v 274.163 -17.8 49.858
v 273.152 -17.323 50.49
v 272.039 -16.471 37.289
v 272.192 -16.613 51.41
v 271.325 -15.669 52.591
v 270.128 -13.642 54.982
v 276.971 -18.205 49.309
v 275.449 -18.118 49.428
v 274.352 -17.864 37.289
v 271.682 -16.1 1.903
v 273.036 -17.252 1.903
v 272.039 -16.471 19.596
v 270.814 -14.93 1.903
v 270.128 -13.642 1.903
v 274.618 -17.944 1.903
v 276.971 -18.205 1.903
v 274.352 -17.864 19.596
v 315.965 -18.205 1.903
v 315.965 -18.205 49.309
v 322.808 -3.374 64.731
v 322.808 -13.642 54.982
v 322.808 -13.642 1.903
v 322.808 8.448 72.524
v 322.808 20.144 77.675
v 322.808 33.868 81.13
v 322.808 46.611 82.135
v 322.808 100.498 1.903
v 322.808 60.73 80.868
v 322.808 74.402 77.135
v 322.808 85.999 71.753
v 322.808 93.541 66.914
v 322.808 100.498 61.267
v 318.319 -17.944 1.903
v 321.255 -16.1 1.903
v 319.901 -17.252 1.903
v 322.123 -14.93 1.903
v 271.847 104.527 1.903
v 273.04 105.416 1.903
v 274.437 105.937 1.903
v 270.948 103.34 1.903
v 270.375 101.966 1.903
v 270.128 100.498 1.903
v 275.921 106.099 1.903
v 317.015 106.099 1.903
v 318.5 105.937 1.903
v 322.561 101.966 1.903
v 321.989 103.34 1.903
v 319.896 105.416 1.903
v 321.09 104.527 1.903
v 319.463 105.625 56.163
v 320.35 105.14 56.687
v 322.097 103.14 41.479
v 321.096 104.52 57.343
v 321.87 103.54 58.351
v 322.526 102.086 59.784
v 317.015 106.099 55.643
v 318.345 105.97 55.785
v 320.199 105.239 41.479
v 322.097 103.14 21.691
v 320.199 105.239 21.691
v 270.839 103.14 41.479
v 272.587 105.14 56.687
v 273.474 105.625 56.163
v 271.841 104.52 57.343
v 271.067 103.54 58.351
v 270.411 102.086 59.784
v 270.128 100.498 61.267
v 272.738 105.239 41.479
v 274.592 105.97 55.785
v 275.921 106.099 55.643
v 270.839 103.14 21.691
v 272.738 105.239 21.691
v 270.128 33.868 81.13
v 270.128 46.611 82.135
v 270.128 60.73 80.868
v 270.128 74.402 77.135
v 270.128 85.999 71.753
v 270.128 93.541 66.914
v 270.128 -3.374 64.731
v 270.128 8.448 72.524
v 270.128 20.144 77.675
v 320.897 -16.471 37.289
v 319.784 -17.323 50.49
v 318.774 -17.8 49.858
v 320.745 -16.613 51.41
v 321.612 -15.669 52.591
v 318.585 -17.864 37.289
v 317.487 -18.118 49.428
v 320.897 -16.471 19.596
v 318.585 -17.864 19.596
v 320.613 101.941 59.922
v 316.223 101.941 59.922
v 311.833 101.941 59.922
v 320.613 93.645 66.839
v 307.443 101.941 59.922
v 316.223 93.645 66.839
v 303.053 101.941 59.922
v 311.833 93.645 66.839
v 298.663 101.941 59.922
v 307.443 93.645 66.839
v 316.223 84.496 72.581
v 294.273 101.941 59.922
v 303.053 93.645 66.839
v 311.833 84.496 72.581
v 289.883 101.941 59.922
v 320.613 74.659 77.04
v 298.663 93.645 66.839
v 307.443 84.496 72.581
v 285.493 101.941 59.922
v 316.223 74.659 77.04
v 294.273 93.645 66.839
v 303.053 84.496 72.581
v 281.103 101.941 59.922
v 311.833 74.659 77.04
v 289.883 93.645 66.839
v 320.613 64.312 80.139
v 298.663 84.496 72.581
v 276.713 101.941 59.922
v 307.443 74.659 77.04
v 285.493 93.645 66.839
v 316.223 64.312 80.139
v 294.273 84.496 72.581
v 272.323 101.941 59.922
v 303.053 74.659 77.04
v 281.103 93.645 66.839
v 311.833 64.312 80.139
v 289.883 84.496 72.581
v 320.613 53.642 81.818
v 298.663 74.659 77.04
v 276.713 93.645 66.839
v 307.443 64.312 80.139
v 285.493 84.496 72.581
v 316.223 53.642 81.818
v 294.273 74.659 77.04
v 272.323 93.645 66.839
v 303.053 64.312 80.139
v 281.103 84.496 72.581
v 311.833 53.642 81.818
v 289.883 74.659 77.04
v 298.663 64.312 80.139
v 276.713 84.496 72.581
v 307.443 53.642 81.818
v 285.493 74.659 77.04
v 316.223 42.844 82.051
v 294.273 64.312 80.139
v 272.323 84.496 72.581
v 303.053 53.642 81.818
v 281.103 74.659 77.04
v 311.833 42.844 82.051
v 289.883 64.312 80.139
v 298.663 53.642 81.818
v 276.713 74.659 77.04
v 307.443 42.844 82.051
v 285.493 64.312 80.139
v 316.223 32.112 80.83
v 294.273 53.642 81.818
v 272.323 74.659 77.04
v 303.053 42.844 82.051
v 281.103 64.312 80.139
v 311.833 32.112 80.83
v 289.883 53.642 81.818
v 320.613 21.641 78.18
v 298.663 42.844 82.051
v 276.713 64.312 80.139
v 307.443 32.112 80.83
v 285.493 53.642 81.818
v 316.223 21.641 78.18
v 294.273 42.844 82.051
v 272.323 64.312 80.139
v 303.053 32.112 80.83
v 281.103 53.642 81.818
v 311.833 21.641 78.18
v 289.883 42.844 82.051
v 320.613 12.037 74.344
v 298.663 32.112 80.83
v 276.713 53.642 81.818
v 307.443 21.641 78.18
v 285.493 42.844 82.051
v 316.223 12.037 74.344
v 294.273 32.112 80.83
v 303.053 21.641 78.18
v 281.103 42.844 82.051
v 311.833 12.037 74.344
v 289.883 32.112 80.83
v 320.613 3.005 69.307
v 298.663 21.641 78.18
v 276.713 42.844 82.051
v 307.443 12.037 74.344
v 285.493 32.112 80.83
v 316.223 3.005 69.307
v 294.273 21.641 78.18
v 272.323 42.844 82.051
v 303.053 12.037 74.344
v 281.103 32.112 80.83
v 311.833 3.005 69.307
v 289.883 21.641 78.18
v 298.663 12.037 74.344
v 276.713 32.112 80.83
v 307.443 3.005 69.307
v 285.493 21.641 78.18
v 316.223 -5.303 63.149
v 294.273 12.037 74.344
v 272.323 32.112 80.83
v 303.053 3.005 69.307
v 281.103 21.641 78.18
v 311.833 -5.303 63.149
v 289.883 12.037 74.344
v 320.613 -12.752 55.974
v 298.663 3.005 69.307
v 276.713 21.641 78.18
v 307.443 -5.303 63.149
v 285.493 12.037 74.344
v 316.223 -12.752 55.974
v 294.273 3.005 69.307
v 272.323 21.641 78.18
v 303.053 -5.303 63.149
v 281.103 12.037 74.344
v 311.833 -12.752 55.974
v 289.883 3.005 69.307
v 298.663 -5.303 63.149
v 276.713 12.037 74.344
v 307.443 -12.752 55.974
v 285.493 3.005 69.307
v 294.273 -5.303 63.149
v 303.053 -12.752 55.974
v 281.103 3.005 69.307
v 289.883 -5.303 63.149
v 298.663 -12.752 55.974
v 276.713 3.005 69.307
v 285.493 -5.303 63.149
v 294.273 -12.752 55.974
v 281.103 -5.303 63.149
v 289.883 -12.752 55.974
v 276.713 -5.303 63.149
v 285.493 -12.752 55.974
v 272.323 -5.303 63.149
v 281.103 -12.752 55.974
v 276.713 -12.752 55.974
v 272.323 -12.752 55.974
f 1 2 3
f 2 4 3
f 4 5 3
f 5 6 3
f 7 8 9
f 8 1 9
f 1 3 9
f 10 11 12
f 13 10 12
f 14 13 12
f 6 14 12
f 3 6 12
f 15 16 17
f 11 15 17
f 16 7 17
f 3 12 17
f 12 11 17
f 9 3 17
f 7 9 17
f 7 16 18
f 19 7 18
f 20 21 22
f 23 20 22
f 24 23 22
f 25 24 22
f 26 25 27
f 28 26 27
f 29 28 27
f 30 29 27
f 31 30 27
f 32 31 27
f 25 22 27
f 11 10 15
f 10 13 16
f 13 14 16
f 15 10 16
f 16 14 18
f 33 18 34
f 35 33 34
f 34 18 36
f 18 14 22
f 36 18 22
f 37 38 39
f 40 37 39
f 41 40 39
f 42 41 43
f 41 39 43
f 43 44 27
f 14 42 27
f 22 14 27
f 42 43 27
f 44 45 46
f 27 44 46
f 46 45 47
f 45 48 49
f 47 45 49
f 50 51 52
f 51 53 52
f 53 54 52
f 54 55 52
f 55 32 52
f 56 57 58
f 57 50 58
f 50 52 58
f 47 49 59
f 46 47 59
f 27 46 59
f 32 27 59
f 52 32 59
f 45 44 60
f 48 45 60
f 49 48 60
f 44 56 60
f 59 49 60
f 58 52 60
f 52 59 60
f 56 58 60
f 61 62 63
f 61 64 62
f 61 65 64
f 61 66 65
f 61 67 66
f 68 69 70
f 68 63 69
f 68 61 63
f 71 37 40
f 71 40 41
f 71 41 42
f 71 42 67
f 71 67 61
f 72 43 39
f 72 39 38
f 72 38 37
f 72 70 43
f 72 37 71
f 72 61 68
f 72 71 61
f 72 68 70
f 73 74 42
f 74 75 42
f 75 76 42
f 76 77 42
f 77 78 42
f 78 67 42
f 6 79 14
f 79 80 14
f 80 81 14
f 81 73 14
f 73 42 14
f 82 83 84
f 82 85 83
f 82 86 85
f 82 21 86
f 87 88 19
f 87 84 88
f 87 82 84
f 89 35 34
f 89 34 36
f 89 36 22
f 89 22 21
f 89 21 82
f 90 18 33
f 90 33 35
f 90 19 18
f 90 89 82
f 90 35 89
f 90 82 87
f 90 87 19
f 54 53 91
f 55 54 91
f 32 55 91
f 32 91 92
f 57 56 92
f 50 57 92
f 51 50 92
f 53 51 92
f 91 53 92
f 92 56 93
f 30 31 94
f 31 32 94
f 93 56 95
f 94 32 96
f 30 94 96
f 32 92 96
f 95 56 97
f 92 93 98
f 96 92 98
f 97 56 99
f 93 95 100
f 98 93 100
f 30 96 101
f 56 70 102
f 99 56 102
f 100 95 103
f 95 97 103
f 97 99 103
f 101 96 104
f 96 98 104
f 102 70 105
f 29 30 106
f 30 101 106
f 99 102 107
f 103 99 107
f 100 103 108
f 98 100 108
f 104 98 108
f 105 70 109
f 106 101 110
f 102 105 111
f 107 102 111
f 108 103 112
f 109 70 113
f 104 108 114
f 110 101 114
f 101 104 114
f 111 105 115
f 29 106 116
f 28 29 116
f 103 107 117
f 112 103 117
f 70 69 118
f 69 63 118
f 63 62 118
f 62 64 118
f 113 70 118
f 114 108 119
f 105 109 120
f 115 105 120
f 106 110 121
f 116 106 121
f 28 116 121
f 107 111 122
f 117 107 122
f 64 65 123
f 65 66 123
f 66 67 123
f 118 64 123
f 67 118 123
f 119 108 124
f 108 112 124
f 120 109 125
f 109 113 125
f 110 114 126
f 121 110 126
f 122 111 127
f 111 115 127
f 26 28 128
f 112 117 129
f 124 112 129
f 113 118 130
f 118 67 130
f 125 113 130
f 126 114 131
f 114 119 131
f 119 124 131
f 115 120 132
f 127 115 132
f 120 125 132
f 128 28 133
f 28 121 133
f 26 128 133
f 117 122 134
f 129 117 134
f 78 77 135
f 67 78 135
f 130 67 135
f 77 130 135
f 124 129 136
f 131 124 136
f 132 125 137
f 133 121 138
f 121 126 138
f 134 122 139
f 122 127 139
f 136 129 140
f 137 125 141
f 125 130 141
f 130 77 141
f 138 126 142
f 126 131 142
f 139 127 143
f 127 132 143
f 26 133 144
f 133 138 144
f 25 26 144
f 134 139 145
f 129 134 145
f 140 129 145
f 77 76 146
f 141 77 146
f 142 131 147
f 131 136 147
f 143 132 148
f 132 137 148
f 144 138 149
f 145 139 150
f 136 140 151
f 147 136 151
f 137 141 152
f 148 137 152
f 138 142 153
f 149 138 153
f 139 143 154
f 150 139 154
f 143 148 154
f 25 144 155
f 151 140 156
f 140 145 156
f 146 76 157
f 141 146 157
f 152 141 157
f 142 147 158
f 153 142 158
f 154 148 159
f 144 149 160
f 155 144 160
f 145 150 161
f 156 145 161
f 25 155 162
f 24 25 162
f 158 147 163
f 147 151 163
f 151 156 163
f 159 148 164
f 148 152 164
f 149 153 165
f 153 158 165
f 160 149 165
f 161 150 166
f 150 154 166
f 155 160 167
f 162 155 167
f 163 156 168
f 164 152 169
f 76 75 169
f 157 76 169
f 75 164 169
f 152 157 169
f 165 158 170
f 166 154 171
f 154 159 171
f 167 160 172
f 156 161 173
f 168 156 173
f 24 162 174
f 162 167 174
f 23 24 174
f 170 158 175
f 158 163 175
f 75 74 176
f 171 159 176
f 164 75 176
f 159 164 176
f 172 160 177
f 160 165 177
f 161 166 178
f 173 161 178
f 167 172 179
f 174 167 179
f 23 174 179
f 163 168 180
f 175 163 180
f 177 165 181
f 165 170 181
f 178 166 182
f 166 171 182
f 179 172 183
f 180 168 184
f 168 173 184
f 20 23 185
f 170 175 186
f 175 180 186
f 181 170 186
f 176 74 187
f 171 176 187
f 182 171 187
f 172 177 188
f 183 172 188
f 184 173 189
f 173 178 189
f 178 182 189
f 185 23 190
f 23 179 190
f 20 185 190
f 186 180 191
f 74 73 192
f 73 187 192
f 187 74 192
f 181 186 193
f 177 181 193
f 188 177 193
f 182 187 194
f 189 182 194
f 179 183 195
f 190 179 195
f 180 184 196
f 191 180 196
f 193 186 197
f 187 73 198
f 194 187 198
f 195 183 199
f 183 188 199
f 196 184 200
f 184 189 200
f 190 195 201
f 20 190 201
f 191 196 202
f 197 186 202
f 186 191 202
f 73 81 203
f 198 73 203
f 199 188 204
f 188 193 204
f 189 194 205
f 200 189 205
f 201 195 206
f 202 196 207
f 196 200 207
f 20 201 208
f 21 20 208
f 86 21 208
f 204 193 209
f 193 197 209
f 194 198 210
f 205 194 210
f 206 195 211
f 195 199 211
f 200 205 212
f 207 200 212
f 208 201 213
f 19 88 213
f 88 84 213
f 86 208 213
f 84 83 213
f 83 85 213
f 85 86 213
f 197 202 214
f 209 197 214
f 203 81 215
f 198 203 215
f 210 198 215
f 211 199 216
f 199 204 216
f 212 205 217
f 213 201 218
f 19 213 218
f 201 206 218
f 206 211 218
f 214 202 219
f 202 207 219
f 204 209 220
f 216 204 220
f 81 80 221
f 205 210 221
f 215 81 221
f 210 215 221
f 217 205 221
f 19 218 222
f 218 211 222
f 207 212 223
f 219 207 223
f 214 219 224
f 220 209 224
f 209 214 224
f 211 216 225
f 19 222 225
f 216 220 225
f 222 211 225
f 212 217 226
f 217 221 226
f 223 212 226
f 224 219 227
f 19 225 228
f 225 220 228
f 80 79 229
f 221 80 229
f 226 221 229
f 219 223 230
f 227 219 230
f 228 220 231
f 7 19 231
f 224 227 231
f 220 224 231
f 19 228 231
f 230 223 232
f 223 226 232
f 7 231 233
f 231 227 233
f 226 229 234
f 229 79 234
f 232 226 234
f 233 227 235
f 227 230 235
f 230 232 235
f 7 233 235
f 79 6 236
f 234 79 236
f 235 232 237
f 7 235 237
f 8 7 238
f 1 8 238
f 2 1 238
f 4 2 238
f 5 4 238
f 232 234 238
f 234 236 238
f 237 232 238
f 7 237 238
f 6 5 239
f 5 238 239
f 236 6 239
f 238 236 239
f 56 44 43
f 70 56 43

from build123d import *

# Parameters (mm, degrees)
LOFT1_START             = 259.08
LOFT1_DEPTH             = 1021.08
CUT_EXTRUDE1_DEPTH      = 1290.62122974
LPATTERN1_COUNT         = 15
LPATTERN1_PITCH         = 53.34
CUT_EXTRUDE4_DEPTH      = 1290.62122974
CUT_EXTRUDE4_DEPTH_BACK = 1290.62122974
SKETCH12_OUTSIDE_W      = 1232.81
SKETCH12_OUTSIDE_H      = 380.64
SKETCH13_W              = 691.165372795
SKETCH13_H              = 233.895042588
CUT_EXTRUDE5_DEPTH      = 360.661187802
SCALE1_SCALE            = 0.95


# Read off the part's stored shape, not the designer's step: Loft1
with BuildPart() as part:
    # Loft1 outline → Loft1 (new body)
    with BuildSketch(Plane.YZ.offset(LOFT1_START)):
        with BuildLine():
            add(Edge.make_bspline(
                [(131.074840176, 0), (131.074840176, 7.585349878), (129.019719734, 22.755453715), (119.988374686, 43.869012627), (105.663719284, 61.816756347), (87.077737999, 75.303505752), (65.572351994, 83.356423395), (42.699502143, 85.39357748), (20.108822767, 81.269408641), (6.324958878, 74.609028267), (-5.786480365, 66.591156976), (-16.410547257, 57.496977056), (-28.534928085, 40.377986455), (-36.116650435, 20.818386871), (-37.835159824, 6.939567352), (-37.835159824, -6.939567352), (-36.116650435, -20.818386871), (-28.534928085, -40.377986455), (-16.410547257, -57.496977056), (-5.786480365, -66.591156976), (6.324958878, -74.609028267), (20.108822767, -81.269408641), (42.699502143, -85.39357748), (65.572351994, -83.356423395), (87.077737999, -75.303505752), (105.663719284, -61.816756347), (119.988374686, -43.869012627), (129.019719734, -22.755453715), (131.074840176, -7.585349878), (131.074840176, 0)],
                knots=[0, 0, 0, 0, 0.04288364, 0.08576728, 0.12865092, 0.17153456, 0.2144182, 0.25730184, 0.30018548, 0.34306912, 0.34306912, 0.38230184, 0.42153456, 0.46076728, 0.5, 0.5, 0.53923272, 0.57846544, 0.61769816, 0.65693088, 0.65693088, 0.69981452, 0.74269816, 0.7855818, 0.82846544, 0.87134908, 0.91423272, 0.95711636, 1, 1, 1, 1], degree=3))
        make_face()
    extrude(amount=LOFT1_DEPTH)

    # Sketch10 (on Front Plane) → Cut-Extrude1 (cut, symmetric)
    with BuildSketch(Plane.XY):
        with BuildLine():
            Line((370.088452905, 78.026436792), (370.088452905, 52.620114122))
            add(Edge.make_bspline(
                [(370.088452905, 52.620114122), (370.995867627, 49.272576747), (375.115065094, 47.839862903)],
                knots=[0, 0, 0, 1, 1, 1], degree=2))
            Line((375.115065094, 47.839862903), (390.064888423, 47.839862903))
            add(Edge.make_bspline(
                [(395.091500612, 52.620114122), (394.184085889, 49.272576747), (390.064888423, 47.839862903)],
                knots=[0, 0, 0, 1, 1, 1], degree=2))
            Line((395.091500612, 52.620114122), (395.091500612, 78.026436792))
            add(Edge.make_bspline(
                [(390.064888423, 82.082511515), (392.217535458, 82.043682887), (394.561076709, 80.900159735), (395.091500612, 78.026436792)],
                knots=[0, 0, 0, 0, 1, 1, 1, 1], degree=3))
            Line((390.064888423, 82.082511515), (375.115065094, 82.082511515))
            add(Edge.make_bspline(
                [(375.115065094, 82.082511515), (372.962418059, 82.043682887), (370.618876808, 80.900159735), (370.088452905, 78.026436792)],
                knots=[0, 0, 0, 0, 1, 1, 1, 1], degree=3))
        make_face()
    cut_extrude1 = extrude(amount=CUT_EXTRUDE1_DEPTH, both=True, mode=Mode.SUBTRACT)

    # LPattern1: Cut-Extrude1 ×15
    with Locations(*[(i * LPATTERN1_PITCH, 0, 0) for i in range(1, LPATTERN1_COUNT)]):
        add(cut_extrude1, mode=Mode.SUBTRACT)

    # Sketch12 outside (on Front Plane) → Cut-Extrude4 (cut, two sides: drawn at the far end of the back side and taken through both)
    with BuildSketch(Plane.XY.offset(-CUT_EXTRUDE4_DEPTH_BACK)):
        with Locations((769.62, 46.62)):
            Rectangle(SKETCH12_OUTSIDE_W, SKETCH12_OUTSIDE_H)
        with BuildLine():
            Line((268.742092957, 103.434867576), (268.742092957, -16.712334523))
            add(Edge.make_bspline(
                [(268.742092957, -16.712334523), (270.508991838, -20.579782205), (273.059867475, -21.576401142), (275.945080305, -21.515503071)],
                knots=[0, 0, 0, 0, 1, 1, 1, 1], degree=3))
            Line((275.945080305, -21.515503071), (316.991660423, -21.515503071))
            add(Edge.make_bspline(
                [(324.194647772, -16.712334523), (322.42774889, -20.579782205), (319.876873253, -21.576401142), (316.991660423, -21.515503071)],
                knots=[0, 0, 0, 0, 1, 1, 1, 1], degree=3))
            Line((324.194647772, -16.712334523), (324.194647772, 103.434867576))
            add(Edge.make_bspline(
                [(324.194647772, 103.434867576), (324.037076707, 106.257728711), (322.158374039, 109.32203364), (318.096841472, 109.330384599)],
                knots=[0, 0, 0, 0, 1, 1, 1, 1], degree=3))
            Line((318.096841472, 109.330384599), (274.839899257, 109.330384599))
            add(Edge.make_bspline(
                [(268.742092957, 103.434867576), (268.899664021, 106.257728711), (270.77836669, 109.32203364), (274.839899257, 109.330384599)],
                knots=[0, 0, 0, 0, 1, 1, 1, 1], degree=3))
        make_face(mode=Mode.SUBTRACT)
    extrude(amount=CUT_EXTRUDE4_DEPTH + CUT_EXTRUDE4_DEPTH_BACK, mode=Mode.SUBTRACT)

    # Sketch13 → Cut-Extrude5 (cut, through all)
    with BuildSketch(Plane(origin=(0, 109.330384599, 0), x_dir=(1, 0, 0), z_dir=(0, 1, 0))):
        with Locations((345.582686398, 116.947521294)):
            Rectangle(SKETCH13_W, SKETCH13_H)
    extrude(amount=-CUT_EXTRUDE5_DEPTH, mode=Mode.SUBTRACT)


with BuildPart() as part_1:
    # Scale1: scaled about (296.468369915, 44.696953726, 38.055435363)
    add(part.part.scale(SCALE1_SCALE).moved(Location((14.823418496, 2.234847686, 1.902771768))))


solid = part_1.part
